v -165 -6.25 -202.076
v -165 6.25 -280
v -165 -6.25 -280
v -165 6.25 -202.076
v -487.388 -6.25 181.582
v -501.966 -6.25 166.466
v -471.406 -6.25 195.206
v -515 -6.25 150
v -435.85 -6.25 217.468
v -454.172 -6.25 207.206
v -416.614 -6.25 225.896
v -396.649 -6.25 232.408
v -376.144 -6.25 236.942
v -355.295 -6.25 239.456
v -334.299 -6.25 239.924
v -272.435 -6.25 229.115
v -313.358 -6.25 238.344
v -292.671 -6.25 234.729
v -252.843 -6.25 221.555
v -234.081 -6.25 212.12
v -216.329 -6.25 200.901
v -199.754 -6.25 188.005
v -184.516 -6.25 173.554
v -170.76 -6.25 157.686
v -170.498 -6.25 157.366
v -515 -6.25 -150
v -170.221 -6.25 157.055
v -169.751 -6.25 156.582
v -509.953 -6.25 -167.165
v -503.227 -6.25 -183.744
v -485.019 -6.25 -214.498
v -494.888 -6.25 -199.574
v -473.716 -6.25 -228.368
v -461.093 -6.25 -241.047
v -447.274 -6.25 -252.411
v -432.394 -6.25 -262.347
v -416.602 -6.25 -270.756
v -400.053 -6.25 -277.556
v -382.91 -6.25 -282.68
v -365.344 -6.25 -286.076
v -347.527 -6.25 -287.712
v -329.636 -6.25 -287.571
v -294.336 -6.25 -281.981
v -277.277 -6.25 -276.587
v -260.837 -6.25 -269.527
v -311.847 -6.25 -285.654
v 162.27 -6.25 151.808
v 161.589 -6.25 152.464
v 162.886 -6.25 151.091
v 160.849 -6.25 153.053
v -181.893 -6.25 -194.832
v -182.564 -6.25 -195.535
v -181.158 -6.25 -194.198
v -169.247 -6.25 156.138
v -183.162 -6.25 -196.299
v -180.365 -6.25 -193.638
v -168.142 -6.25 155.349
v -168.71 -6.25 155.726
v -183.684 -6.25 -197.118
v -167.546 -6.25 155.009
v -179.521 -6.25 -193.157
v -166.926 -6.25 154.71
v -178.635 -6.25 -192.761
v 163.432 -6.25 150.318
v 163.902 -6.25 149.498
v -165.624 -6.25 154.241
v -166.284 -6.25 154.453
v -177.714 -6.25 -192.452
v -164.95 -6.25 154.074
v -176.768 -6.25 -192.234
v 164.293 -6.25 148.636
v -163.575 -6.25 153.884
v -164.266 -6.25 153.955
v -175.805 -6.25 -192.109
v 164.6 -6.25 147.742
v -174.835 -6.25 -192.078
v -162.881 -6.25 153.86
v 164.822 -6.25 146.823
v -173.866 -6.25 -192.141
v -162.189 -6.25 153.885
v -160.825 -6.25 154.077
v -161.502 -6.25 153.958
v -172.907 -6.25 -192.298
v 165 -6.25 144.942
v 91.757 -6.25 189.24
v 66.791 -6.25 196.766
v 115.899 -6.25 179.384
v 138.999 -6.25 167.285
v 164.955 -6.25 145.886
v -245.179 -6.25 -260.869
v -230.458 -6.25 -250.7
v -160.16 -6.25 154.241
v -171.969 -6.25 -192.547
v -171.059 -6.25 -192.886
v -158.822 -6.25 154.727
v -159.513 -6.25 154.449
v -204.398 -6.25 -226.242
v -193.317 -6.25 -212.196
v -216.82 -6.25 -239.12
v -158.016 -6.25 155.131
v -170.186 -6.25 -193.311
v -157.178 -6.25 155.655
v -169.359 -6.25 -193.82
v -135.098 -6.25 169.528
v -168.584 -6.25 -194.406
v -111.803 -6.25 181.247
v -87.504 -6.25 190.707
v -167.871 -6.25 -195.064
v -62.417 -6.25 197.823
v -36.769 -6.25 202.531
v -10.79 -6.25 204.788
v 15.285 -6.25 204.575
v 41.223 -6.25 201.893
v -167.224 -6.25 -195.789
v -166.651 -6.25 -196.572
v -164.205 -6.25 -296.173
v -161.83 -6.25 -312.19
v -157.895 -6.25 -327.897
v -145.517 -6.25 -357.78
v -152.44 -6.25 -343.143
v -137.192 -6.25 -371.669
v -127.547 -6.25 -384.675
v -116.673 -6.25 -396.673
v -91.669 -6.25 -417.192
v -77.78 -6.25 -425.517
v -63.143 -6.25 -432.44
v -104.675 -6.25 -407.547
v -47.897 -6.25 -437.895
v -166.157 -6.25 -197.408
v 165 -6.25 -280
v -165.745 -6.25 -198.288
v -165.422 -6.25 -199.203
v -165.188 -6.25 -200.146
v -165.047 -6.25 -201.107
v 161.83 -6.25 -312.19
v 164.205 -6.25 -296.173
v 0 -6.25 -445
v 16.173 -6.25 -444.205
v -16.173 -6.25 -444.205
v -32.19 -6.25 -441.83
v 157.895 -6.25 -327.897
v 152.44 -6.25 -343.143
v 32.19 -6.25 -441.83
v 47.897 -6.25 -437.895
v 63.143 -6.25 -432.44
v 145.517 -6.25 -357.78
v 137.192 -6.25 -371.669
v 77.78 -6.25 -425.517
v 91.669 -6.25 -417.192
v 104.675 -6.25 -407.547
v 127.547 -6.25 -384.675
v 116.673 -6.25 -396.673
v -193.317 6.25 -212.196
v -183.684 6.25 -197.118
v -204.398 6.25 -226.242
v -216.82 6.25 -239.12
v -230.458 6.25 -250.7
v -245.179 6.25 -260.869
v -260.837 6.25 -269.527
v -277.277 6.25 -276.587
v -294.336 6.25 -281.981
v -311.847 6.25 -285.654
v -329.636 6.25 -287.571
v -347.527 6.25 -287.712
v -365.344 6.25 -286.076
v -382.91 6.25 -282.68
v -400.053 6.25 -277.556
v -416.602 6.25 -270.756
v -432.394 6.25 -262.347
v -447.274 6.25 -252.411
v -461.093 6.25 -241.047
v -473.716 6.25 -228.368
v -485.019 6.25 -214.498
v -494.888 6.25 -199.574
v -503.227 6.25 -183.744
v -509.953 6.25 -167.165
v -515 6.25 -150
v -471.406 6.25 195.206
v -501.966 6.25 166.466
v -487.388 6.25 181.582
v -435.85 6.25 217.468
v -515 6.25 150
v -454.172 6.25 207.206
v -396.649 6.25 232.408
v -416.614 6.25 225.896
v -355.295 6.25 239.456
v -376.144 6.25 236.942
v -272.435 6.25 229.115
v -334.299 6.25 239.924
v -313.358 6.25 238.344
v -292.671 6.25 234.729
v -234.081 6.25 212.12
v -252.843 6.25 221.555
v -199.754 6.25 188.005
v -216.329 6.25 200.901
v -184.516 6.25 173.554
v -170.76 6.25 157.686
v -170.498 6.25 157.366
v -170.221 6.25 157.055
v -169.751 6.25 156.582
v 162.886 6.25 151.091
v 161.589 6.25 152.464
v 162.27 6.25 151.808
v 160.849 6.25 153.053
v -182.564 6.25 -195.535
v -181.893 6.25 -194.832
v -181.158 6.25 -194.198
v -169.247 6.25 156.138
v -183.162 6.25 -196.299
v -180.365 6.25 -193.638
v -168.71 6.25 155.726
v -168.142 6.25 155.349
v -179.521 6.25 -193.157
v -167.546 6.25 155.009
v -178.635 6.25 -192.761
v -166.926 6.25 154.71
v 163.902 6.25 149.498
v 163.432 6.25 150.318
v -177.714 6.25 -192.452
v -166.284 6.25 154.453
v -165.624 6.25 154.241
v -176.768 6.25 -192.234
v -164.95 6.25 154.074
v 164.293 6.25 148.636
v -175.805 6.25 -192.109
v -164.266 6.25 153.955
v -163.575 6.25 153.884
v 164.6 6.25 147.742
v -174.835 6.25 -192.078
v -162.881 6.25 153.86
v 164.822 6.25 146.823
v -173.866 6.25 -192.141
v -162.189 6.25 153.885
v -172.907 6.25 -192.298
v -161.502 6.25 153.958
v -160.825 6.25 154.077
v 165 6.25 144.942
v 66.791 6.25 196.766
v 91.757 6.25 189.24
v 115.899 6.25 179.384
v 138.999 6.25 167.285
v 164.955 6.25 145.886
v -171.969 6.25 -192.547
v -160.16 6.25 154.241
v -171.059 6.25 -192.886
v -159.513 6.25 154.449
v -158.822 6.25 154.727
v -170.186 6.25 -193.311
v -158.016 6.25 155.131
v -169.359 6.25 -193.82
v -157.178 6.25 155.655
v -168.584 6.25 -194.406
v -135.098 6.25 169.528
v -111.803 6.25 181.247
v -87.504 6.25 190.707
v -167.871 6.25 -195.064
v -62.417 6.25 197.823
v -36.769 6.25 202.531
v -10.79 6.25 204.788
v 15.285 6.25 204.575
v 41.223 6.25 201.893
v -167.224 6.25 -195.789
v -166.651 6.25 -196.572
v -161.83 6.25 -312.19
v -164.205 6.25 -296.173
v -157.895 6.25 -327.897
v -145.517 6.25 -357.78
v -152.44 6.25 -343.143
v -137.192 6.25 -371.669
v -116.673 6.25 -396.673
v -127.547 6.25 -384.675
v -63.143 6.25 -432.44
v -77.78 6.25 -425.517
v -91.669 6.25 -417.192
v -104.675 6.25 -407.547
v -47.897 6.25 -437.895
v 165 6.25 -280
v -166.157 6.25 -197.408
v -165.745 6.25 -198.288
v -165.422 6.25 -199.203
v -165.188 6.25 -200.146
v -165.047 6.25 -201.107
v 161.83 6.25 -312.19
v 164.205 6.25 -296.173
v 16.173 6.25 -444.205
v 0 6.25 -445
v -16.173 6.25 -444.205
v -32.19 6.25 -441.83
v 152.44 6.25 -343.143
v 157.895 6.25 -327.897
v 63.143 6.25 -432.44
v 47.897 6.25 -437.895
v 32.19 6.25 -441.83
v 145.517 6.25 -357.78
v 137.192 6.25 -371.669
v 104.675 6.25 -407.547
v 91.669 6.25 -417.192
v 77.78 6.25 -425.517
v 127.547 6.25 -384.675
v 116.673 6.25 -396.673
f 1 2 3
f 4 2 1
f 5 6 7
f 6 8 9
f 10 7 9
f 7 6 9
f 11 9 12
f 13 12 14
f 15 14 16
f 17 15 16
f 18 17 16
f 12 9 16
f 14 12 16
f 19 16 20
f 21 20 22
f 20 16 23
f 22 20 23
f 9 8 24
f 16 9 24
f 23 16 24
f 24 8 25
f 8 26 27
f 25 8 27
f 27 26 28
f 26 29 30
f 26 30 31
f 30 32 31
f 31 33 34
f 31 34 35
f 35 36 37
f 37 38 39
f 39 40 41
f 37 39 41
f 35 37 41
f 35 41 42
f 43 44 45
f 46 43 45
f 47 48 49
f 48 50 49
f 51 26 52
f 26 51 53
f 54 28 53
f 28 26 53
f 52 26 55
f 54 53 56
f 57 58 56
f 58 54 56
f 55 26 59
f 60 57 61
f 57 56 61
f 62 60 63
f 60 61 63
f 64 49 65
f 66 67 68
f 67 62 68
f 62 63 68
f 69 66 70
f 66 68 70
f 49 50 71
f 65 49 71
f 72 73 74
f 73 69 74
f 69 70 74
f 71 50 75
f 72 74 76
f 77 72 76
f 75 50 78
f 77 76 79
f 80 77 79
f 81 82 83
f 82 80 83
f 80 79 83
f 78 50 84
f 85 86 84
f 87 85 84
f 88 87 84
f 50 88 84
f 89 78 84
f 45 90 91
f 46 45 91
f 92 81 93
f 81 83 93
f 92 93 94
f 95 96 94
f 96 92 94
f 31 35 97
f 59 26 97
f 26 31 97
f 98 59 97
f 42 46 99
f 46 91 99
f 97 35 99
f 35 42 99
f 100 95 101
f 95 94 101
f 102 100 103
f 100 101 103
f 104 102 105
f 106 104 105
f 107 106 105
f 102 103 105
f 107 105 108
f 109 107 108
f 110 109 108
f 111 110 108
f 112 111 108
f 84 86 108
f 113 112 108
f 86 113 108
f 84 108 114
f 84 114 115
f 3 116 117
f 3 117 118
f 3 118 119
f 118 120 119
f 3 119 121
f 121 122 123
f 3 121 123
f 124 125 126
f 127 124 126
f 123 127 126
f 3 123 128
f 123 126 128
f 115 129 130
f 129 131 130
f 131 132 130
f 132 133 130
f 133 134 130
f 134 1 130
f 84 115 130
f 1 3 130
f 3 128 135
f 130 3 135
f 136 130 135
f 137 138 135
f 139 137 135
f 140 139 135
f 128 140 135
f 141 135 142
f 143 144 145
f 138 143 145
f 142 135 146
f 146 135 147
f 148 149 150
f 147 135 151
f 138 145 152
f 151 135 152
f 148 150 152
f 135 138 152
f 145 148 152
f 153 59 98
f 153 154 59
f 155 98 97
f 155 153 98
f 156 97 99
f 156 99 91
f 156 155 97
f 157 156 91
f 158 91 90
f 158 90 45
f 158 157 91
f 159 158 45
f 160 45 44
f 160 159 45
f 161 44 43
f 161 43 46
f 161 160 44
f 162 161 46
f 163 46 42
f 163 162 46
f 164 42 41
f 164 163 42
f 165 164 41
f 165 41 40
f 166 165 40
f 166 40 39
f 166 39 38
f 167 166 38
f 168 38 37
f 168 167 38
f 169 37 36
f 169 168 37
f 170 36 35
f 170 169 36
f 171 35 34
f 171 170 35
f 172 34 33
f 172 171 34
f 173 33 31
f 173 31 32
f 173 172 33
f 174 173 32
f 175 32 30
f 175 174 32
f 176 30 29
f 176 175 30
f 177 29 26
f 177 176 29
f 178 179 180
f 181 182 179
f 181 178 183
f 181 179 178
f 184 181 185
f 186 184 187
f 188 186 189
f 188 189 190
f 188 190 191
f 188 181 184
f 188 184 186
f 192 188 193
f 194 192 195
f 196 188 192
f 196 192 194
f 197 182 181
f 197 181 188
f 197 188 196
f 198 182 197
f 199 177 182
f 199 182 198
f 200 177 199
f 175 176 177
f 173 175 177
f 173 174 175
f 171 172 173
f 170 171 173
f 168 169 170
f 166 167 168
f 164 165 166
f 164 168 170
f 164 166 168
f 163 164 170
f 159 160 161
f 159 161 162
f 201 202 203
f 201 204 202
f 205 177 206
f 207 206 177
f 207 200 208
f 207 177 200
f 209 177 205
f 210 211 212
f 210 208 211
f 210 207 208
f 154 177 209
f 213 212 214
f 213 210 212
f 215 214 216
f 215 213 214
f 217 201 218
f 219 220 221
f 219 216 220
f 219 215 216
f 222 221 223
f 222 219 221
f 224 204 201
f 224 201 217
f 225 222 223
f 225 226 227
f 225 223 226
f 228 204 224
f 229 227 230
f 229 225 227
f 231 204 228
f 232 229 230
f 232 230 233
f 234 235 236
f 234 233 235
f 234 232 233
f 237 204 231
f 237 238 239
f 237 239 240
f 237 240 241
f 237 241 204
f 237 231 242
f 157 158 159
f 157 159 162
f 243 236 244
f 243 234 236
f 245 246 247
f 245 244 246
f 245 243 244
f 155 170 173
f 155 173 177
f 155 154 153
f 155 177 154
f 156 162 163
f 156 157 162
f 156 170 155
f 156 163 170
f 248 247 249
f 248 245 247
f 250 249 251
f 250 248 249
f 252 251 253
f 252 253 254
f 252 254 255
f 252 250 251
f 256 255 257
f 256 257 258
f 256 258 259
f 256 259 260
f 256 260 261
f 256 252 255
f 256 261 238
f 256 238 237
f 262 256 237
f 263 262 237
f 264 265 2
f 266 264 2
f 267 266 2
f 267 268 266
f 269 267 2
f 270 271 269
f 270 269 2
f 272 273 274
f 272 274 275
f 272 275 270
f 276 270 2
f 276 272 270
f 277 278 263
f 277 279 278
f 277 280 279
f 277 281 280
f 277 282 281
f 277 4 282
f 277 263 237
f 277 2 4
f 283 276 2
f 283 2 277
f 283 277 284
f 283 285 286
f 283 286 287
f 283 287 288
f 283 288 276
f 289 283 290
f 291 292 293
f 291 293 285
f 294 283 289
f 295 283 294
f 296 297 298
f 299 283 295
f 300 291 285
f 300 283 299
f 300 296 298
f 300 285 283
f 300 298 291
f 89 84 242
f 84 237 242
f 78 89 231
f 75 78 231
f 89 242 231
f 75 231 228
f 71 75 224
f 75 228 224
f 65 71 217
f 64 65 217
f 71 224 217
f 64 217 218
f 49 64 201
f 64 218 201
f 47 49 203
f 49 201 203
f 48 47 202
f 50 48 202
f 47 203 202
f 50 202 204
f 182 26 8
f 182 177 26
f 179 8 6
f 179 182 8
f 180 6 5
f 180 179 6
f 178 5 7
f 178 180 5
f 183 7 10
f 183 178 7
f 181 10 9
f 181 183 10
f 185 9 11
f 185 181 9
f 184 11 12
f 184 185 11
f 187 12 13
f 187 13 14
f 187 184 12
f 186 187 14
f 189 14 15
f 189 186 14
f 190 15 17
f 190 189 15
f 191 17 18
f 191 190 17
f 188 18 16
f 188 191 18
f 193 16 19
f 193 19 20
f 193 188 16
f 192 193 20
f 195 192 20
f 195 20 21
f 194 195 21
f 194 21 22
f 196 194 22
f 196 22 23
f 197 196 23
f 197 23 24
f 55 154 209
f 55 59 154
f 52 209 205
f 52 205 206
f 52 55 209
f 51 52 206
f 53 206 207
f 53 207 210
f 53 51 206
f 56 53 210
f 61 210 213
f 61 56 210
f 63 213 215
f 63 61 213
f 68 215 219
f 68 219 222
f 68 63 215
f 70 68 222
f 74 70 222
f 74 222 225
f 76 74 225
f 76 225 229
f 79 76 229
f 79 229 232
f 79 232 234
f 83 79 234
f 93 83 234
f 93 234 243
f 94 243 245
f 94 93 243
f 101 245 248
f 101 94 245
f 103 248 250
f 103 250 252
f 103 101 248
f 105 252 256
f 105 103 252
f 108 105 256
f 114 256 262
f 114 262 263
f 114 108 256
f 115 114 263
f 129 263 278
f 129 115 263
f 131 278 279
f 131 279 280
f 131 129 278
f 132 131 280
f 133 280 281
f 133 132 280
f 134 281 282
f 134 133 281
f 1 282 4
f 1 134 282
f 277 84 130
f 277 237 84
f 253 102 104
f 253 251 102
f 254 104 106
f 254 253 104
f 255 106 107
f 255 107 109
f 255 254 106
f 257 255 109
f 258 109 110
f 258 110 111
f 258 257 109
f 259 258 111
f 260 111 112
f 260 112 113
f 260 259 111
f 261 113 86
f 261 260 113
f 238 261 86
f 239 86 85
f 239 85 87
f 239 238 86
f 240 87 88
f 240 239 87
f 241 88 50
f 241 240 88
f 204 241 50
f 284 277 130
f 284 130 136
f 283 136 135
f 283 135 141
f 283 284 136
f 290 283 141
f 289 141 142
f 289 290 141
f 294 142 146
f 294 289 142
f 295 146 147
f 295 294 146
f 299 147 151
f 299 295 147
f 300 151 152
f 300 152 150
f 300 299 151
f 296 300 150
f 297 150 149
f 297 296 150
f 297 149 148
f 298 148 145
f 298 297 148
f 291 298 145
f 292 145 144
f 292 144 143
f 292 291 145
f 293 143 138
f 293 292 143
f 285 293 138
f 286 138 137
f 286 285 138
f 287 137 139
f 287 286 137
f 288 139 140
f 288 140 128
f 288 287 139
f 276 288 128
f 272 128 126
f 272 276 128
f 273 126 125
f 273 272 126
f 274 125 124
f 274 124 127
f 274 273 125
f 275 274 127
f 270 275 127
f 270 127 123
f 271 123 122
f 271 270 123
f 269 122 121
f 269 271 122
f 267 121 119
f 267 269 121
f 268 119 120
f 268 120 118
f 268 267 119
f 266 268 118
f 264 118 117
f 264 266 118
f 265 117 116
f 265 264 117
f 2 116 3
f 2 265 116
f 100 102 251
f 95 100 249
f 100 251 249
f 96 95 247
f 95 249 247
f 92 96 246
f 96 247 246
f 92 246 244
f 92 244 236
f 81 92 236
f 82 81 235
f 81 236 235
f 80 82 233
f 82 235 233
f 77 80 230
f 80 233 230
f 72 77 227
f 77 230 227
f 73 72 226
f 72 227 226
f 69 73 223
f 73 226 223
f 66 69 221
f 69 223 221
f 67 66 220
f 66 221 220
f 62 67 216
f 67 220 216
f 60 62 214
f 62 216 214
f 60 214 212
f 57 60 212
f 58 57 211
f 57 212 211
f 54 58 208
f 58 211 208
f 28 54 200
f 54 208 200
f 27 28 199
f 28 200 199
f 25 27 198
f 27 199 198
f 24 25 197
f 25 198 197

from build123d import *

# Parameters (mm, degrees)
BOSS_EXTRUDE1_DEPTH = 6.25
FILLET1_R           = 10


with BuildPart() as part:
    # Sketch2 → Boss-Extrude1 (new body, symmetric)
    with BuildSketch(Plane(origin=(0, 0, 0), x_dir=(1, 0, 0), z_dir=(0, 1, 0))):
        with BuildLine():
            Line((-515, 150), (-515, -150))
            ThreePointArc((-515, -150), (-340, -240), (-165, -150))
            ThreePointArc((-165, -150), (0, -205), (165, -150))
            Line((165, -150), (165, 150))
            Line((165, 150), (165, 280))
            ThreePointArc((165, 280), (0, 445), (-165, 280))
            Line((-165, 280), (-165, 150))
            ThreePointArc((-165, 150), (-340, 287.869251134), (-515, 150))
        make_face()
    extrude(amount=BOSS_EXTRUDE1_DEPTH, both=True)

    # Fillet1
    fillet1_edges = [part.edges().sort_by_distance(p)[0] for p in [
        (-165, 0, 150),
        (-165, 0, -150),
        (165, 0, 150),
    ]]
    fillet(fillet1_edges, radius=FILLET1_R)


solid = part.part
